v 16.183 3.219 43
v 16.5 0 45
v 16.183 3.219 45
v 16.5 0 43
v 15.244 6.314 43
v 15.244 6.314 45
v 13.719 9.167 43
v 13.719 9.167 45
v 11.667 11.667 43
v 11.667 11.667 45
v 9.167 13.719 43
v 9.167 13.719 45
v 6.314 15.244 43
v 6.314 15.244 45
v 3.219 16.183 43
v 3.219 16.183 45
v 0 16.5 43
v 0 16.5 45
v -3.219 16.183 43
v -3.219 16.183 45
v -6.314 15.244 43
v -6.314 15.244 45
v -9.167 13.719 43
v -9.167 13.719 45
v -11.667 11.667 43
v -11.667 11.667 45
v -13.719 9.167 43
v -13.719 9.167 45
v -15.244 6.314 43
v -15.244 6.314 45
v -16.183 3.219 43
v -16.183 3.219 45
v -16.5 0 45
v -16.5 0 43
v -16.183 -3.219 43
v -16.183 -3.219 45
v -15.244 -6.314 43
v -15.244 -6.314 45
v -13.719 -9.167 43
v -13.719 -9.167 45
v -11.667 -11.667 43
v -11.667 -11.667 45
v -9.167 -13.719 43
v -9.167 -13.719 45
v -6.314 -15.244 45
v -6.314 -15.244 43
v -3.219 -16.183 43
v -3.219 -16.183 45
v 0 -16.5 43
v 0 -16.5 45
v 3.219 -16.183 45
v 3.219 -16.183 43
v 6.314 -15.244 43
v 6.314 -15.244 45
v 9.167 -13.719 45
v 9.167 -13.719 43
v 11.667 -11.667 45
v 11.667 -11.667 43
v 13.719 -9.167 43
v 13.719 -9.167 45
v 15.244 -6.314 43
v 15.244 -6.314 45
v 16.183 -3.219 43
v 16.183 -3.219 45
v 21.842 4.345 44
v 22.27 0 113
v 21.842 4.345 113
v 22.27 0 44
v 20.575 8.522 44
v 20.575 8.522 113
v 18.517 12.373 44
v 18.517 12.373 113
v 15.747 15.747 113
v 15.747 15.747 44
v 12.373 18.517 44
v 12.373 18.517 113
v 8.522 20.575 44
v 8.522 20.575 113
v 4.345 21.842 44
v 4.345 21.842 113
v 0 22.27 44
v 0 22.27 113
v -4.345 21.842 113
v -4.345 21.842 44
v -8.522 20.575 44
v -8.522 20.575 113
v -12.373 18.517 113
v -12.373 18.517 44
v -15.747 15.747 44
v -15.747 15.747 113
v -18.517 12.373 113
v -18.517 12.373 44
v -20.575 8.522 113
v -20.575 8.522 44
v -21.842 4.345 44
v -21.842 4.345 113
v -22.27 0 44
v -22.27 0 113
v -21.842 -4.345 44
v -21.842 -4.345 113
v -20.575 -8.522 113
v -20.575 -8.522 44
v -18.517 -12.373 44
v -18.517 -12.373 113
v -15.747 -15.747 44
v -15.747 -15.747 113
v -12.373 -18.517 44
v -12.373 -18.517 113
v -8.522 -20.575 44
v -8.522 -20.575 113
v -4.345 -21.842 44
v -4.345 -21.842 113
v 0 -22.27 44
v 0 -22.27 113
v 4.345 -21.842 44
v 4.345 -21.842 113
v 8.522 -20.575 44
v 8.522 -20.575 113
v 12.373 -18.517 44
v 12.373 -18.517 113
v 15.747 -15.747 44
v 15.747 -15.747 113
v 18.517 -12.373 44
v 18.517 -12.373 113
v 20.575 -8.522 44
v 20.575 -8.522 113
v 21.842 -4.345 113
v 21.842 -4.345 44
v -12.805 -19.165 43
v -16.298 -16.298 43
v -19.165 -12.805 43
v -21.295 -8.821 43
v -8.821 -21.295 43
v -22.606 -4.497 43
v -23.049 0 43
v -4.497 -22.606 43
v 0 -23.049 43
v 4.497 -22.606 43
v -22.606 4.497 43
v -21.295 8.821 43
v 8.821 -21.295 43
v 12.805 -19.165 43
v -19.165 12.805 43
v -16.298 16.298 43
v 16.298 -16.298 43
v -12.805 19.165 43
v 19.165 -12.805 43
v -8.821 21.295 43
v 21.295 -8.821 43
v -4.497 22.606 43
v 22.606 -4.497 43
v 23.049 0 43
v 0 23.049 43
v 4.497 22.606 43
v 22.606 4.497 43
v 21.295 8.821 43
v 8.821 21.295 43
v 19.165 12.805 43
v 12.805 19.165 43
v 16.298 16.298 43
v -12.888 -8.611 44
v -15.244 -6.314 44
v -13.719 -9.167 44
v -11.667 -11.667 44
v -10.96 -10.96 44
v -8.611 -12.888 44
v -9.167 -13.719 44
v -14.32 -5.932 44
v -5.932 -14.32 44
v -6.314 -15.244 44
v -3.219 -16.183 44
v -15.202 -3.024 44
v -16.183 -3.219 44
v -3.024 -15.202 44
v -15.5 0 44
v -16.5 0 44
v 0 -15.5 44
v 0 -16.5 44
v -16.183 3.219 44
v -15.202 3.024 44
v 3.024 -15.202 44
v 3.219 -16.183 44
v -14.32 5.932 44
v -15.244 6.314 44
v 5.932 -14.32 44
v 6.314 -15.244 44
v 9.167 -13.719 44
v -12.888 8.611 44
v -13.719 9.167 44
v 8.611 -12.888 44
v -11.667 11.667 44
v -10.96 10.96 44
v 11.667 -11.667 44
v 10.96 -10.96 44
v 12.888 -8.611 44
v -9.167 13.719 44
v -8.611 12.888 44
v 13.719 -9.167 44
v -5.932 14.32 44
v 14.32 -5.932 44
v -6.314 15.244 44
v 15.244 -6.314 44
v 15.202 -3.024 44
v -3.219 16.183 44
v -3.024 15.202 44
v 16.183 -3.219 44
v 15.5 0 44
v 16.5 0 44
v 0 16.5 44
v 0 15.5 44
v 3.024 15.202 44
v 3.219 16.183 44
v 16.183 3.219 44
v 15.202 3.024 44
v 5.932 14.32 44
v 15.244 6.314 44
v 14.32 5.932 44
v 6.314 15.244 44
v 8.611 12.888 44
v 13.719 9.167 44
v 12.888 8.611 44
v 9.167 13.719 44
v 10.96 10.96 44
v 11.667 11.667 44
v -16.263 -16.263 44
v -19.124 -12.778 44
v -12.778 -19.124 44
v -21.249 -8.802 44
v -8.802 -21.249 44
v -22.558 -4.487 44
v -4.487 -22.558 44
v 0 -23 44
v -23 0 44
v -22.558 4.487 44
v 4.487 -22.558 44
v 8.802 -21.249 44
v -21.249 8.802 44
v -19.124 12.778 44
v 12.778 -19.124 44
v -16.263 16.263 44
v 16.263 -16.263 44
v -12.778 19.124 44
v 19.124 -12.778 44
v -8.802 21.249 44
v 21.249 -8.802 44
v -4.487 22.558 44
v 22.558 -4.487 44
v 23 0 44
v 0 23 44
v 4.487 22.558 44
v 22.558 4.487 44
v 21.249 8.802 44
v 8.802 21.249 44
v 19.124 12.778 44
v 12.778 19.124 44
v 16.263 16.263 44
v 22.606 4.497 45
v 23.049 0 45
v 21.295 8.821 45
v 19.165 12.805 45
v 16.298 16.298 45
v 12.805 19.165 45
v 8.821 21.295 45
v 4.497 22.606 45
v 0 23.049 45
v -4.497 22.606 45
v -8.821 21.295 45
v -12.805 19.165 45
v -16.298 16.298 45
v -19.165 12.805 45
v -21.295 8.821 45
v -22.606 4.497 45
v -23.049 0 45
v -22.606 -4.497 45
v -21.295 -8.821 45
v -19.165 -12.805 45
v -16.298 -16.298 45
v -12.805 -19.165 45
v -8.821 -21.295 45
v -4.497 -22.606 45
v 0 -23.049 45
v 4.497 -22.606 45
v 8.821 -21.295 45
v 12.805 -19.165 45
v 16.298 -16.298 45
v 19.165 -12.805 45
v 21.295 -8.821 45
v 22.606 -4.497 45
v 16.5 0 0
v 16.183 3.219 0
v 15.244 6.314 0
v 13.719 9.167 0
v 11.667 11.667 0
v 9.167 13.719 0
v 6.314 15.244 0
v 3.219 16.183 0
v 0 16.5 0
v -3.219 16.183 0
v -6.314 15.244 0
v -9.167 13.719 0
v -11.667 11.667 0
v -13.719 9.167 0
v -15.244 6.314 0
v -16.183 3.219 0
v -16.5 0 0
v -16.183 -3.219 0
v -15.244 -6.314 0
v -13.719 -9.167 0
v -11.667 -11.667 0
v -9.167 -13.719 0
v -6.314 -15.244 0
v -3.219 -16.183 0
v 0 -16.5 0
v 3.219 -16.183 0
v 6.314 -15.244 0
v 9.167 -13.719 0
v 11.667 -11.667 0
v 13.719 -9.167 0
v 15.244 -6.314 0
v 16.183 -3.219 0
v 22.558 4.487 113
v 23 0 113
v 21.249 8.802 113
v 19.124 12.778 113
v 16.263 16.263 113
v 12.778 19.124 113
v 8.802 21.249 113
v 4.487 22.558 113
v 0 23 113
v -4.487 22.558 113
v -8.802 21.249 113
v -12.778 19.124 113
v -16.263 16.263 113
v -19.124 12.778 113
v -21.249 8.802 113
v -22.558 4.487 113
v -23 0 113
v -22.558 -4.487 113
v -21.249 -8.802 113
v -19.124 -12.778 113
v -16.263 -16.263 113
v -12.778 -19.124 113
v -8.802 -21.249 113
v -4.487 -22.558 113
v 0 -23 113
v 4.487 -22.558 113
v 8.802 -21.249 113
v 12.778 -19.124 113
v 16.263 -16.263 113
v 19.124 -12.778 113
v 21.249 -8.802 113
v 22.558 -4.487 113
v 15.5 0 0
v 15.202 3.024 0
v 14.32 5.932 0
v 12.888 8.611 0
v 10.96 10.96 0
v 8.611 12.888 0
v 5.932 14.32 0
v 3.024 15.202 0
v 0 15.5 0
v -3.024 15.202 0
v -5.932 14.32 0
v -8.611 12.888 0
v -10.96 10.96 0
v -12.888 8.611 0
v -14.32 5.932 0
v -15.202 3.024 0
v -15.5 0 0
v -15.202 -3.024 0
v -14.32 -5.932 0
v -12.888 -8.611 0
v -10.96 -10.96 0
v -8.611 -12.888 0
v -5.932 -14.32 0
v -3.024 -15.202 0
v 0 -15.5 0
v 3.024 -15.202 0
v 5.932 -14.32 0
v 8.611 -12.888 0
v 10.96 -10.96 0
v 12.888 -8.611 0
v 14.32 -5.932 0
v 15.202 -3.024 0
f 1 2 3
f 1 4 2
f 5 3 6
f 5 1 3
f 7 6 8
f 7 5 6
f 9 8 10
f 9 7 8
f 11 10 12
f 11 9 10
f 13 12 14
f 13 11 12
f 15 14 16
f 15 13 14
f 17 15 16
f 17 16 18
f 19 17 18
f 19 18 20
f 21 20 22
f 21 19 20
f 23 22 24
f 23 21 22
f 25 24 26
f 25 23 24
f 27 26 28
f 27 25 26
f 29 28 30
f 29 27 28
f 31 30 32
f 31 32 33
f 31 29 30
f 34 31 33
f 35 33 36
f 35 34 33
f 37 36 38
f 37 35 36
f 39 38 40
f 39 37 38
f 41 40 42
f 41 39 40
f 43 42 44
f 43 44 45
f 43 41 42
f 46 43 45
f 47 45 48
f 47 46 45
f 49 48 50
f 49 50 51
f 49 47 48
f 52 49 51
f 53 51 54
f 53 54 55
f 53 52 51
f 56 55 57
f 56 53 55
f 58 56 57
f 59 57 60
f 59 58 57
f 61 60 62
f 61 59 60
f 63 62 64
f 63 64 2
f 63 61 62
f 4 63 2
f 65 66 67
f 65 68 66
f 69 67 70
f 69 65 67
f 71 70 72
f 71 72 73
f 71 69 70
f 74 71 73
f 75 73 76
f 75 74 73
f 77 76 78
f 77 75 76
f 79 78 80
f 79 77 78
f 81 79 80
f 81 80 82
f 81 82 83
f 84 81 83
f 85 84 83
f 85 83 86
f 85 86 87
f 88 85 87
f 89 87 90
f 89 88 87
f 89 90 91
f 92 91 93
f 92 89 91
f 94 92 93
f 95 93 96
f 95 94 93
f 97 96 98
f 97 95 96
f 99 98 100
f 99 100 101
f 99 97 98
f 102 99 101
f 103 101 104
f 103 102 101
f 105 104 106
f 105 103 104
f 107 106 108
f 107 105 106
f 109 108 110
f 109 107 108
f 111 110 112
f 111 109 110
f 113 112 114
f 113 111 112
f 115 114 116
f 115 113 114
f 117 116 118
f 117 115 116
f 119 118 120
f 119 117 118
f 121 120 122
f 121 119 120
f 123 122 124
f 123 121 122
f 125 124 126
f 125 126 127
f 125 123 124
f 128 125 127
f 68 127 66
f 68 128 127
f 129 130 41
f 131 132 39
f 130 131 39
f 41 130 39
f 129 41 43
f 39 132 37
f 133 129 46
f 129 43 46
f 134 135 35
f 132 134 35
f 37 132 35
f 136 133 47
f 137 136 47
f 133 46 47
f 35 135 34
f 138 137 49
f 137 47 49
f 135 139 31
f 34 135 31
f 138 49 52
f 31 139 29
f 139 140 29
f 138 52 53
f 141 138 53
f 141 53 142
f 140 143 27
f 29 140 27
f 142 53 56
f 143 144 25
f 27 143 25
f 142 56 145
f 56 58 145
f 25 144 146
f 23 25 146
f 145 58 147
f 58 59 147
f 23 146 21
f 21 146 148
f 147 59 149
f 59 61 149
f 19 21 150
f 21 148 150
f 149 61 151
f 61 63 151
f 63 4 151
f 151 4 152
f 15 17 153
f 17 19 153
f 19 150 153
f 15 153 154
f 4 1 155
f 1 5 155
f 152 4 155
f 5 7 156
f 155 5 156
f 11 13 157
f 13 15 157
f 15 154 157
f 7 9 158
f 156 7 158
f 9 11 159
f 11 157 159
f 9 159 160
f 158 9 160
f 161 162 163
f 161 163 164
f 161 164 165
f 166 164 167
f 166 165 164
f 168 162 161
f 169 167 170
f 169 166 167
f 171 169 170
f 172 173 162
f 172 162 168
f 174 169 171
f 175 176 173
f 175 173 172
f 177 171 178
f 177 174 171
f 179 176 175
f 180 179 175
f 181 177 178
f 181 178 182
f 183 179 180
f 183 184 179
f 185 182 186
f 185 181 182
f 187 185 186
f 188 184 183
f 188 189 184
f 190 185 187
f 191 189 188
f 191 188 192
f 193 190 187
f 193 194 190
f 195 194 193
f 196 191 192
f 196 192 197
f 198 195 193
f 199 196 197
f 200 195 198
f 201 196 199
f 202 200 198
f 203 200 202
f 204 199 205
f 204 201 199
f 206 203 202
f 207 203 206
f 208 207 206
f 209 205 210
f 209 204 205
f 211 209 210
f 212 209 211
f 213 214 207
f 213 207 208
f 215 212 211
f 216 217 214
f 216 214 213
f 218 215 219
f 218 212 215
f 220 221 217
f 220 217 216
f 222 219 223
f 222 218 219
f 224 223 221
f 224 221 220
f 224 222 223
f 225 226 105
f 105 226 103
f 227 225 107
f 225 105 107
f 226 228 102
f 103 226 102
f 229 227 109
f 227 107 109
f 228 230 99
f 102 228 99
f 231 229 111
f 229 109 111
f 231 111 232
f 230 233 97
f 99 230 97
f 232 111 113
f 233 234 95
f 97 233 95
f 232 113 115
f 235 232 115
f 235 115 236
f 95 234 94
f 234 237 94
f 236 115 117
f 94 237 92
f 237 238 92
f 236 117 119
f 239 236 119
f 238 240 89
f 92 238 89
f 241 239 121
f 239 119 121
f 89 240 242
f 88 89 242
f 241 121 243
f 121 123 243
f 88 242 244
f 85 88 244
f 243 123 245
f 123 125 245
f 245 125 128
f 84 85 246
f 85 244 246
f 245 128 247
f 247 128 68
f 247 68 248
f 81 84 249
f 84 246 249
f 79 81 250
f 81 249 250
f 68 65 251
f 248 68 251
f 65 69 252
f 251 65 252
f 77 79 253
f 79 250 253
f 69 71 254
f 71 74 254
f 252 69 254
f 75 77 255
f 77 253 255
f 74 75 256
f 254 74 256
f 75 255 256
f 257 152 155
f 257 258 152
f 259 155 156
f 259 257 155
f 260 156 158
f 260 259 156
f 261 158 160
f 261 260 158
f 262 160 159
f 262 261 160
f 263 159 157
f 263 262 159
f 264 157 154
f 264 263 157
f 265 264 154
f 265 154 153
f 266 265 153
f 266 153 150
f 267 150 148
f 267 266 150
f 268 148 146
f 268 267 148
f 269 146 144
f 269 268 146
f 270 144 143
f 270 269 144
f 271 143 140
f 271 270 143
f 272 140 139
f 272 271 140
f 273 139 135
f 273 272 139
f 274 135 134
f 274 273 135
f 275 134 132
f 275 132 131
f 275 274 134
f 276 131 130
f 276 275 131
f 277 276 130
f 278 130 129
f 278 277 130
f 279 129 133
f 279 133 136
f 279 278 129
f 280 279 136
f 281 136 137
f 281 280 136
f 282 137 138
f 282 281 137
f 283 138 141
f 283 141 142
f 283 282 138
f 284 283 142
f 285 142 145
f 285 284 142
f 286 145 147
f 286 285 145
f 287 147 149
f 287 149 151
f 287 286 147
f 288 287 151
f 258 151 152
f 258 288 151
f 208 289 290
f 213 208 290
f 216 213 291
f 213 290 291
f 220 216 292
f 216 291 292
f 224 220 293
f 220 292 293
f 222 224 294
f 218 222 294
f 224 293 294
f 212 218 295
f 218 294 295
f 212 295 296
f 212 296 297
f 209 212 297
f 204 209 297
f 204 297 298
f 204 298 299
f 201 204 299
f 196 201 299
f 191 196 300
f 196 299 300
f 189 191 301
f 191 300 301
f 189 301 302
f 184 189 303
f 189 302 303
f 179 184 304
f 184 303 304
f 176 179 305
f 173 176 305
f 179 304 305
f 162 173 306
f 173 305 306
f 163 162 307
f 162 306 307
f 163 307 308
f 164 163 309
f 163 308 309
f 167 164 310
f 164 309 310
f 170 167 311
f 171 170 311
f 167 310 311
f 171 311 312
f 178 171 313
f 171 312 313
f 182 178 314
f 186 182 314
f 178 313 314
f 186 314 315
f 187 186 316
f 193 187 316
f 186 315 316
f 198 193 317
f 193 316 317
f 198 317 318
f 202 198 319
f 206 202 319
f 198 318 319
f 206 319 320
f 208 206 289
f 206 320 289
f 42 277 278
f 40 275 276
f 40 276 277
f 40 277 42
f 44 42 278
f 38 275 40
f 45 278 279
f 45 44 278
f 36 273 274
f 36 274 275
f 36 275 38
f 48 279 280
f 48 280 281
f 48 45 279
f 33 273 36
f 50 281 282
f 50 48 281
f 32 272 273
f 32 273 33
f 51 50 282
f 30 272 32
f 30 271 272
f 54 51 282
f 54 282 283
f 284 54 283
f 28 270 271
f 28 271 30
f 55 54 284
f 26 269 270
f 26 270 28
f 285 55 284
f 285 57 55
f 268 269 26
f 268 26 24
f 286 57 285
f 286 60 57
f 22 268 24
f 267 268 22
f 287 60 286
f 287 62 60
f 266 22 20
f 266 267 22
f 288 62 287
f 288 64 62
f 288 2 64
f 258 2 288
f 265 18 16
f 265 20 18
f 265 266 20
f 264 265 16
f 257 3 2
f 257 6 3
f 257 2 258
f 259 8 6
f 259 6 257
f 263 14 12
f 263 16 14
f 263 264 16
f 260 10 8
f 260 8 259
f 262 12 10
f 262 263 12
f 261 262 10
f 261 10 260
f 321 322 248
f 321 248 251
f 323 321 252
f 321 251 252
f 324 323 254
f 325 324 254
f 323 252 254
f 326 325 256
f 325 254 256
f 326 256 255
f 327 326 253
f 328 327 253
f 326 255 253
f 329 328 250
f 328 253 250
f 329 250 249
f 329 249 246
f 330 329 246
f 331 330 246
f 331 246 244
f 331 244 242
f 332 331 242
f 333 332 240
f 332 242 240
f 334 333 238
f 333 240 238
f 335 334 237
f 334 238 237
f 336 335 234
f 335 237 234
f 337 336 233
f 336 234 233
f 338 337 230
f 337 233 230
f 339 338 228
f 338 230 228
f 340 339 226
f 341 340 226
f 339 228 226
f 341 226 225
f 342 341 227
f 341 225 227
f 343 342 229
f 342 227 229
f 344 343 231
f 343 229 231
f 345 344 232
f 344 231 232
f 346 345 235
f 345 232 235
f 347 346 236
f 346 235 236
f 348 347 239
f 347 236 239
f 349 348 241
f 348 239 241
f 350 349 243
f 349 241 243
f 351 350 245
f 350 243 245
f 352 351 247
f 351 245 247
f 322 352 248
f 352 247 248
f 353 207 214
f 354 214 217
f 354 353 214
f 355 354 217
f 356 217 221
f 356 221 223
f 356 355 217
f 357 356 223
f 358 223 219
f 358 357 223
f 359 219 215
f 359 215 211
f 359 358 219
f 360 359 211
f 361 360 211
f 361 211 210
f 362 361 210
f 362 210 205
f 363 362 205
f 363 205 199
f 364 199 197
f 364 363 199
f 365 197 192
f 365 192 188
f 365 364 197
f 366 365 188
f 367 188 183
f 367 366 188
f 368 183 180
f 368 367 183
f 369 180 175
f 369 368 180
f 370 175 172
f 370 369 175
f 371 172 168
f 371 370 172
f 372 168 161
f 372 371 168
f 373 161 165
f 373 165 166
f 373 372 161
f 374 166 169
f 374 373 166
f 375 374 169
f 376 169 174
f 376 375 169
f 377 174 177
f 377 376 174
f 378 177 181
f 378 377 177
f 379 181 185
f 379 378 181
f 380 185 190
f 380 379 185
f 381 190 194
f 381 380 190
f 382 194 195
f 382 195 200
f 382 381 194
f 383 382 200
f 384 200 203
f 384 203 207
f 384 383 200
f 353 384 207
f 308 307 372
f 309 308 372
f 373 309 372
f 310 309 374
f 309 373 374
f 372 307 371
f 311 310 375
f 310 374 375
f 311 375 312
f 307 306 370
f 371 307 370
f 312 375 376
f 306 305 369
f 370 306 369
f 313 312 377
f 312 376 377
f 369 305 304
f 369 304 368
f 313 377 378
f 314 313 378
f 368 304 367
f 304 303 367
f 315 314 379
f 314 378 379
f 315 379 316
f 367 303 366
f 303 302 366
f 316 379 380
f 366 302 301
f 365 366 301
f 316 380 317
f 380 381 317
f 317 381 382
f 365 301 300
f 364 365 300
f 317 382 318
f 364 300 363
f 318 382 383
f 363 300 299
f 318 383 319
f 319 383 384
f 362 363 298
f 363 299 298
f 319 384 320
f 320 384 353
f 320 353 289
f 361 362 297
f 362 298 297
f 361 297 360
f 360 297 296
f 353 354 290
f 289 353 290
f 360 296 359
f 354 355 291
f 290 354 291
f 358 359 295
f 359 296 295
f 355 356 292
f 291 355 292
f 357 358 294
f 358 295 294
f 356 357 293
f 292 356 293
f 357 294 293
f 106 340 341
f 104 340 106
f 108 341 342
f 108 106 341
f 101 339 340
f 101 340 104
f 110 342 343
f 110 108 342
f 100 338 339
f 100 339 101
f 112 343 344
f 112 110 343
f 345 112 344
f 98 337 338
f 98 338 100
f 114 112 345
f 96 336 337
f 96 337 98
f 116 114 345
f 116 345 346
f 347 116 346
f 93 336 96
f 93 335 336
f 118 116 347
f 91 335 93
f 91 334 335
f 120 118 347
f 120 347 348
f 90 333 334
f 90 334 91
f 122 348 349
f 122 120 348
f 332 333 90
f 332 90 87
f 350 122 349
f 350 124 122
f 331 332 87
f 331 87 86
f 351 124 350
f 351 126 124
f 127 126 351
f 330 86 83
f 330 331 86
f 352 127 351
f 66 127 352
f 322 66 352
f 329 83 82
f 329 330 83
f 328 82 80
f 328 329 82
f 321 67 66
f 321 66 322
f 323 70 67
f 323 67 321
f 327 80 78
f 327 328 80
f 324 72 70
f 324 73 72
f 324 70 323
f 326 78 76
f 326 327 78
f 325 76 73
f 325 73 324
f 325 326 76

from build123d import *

# Parameters (mm, degrees)
F0_R        = 16.5
F0_R_2      = 15.5
F1_DEPTH    = 44
F2_R        = 23
F2_R_2      = 22.27
F3_DEPTH    = 25
F3_FACE_R   = 23
F3_FACE_R_2 = 22.27
F4_DEPTH    = 44
F5_R        = 23.049095
F5_R_2      = 16.5
F6_DEPTH    = 1


with BuildPart() as f1:
    # F0 (on Top) → F1 (new body)
    with BuildSketch(Plane.XY):
        Circle(F0_R)
        Circle(F0_R_2, mode=Mode.SUBTRACT)
    extrude(amount=F1_DEPTH)


with BuildPart() as f3:
    # F2 (on face) → F3 (new body)
    with BuildSketch(Plane.XY.offset(44)):
        Circle(F2_R)
        Circle(F2_R_2, mode=Mode.SUBTRACT)
    extrude(amount=F3_DEPTH)

    # F3_face (on face) → F4 (join)
    with BuildSketch(Plane.XY.offset(69)):
        Circle(F3_FACE_R)
        Circle(F3_FACE_R_2, mode=Mode.SUBTRACT)
    extrude(amount=F4_DEPTH)


with BuildPart() as f6:
    # F5 (on face) → F6 (new body, symmetric)
    with BuildSketch(Plane.XY.offset(44)):
        Circle(F5_R)
        Circle(F5_R_2, mode=Mode.SUBTRACT)
    extrude(amount=F6_DEPTH, both=True)


solid = Compound([f1.part, f3.part, f6.part])
